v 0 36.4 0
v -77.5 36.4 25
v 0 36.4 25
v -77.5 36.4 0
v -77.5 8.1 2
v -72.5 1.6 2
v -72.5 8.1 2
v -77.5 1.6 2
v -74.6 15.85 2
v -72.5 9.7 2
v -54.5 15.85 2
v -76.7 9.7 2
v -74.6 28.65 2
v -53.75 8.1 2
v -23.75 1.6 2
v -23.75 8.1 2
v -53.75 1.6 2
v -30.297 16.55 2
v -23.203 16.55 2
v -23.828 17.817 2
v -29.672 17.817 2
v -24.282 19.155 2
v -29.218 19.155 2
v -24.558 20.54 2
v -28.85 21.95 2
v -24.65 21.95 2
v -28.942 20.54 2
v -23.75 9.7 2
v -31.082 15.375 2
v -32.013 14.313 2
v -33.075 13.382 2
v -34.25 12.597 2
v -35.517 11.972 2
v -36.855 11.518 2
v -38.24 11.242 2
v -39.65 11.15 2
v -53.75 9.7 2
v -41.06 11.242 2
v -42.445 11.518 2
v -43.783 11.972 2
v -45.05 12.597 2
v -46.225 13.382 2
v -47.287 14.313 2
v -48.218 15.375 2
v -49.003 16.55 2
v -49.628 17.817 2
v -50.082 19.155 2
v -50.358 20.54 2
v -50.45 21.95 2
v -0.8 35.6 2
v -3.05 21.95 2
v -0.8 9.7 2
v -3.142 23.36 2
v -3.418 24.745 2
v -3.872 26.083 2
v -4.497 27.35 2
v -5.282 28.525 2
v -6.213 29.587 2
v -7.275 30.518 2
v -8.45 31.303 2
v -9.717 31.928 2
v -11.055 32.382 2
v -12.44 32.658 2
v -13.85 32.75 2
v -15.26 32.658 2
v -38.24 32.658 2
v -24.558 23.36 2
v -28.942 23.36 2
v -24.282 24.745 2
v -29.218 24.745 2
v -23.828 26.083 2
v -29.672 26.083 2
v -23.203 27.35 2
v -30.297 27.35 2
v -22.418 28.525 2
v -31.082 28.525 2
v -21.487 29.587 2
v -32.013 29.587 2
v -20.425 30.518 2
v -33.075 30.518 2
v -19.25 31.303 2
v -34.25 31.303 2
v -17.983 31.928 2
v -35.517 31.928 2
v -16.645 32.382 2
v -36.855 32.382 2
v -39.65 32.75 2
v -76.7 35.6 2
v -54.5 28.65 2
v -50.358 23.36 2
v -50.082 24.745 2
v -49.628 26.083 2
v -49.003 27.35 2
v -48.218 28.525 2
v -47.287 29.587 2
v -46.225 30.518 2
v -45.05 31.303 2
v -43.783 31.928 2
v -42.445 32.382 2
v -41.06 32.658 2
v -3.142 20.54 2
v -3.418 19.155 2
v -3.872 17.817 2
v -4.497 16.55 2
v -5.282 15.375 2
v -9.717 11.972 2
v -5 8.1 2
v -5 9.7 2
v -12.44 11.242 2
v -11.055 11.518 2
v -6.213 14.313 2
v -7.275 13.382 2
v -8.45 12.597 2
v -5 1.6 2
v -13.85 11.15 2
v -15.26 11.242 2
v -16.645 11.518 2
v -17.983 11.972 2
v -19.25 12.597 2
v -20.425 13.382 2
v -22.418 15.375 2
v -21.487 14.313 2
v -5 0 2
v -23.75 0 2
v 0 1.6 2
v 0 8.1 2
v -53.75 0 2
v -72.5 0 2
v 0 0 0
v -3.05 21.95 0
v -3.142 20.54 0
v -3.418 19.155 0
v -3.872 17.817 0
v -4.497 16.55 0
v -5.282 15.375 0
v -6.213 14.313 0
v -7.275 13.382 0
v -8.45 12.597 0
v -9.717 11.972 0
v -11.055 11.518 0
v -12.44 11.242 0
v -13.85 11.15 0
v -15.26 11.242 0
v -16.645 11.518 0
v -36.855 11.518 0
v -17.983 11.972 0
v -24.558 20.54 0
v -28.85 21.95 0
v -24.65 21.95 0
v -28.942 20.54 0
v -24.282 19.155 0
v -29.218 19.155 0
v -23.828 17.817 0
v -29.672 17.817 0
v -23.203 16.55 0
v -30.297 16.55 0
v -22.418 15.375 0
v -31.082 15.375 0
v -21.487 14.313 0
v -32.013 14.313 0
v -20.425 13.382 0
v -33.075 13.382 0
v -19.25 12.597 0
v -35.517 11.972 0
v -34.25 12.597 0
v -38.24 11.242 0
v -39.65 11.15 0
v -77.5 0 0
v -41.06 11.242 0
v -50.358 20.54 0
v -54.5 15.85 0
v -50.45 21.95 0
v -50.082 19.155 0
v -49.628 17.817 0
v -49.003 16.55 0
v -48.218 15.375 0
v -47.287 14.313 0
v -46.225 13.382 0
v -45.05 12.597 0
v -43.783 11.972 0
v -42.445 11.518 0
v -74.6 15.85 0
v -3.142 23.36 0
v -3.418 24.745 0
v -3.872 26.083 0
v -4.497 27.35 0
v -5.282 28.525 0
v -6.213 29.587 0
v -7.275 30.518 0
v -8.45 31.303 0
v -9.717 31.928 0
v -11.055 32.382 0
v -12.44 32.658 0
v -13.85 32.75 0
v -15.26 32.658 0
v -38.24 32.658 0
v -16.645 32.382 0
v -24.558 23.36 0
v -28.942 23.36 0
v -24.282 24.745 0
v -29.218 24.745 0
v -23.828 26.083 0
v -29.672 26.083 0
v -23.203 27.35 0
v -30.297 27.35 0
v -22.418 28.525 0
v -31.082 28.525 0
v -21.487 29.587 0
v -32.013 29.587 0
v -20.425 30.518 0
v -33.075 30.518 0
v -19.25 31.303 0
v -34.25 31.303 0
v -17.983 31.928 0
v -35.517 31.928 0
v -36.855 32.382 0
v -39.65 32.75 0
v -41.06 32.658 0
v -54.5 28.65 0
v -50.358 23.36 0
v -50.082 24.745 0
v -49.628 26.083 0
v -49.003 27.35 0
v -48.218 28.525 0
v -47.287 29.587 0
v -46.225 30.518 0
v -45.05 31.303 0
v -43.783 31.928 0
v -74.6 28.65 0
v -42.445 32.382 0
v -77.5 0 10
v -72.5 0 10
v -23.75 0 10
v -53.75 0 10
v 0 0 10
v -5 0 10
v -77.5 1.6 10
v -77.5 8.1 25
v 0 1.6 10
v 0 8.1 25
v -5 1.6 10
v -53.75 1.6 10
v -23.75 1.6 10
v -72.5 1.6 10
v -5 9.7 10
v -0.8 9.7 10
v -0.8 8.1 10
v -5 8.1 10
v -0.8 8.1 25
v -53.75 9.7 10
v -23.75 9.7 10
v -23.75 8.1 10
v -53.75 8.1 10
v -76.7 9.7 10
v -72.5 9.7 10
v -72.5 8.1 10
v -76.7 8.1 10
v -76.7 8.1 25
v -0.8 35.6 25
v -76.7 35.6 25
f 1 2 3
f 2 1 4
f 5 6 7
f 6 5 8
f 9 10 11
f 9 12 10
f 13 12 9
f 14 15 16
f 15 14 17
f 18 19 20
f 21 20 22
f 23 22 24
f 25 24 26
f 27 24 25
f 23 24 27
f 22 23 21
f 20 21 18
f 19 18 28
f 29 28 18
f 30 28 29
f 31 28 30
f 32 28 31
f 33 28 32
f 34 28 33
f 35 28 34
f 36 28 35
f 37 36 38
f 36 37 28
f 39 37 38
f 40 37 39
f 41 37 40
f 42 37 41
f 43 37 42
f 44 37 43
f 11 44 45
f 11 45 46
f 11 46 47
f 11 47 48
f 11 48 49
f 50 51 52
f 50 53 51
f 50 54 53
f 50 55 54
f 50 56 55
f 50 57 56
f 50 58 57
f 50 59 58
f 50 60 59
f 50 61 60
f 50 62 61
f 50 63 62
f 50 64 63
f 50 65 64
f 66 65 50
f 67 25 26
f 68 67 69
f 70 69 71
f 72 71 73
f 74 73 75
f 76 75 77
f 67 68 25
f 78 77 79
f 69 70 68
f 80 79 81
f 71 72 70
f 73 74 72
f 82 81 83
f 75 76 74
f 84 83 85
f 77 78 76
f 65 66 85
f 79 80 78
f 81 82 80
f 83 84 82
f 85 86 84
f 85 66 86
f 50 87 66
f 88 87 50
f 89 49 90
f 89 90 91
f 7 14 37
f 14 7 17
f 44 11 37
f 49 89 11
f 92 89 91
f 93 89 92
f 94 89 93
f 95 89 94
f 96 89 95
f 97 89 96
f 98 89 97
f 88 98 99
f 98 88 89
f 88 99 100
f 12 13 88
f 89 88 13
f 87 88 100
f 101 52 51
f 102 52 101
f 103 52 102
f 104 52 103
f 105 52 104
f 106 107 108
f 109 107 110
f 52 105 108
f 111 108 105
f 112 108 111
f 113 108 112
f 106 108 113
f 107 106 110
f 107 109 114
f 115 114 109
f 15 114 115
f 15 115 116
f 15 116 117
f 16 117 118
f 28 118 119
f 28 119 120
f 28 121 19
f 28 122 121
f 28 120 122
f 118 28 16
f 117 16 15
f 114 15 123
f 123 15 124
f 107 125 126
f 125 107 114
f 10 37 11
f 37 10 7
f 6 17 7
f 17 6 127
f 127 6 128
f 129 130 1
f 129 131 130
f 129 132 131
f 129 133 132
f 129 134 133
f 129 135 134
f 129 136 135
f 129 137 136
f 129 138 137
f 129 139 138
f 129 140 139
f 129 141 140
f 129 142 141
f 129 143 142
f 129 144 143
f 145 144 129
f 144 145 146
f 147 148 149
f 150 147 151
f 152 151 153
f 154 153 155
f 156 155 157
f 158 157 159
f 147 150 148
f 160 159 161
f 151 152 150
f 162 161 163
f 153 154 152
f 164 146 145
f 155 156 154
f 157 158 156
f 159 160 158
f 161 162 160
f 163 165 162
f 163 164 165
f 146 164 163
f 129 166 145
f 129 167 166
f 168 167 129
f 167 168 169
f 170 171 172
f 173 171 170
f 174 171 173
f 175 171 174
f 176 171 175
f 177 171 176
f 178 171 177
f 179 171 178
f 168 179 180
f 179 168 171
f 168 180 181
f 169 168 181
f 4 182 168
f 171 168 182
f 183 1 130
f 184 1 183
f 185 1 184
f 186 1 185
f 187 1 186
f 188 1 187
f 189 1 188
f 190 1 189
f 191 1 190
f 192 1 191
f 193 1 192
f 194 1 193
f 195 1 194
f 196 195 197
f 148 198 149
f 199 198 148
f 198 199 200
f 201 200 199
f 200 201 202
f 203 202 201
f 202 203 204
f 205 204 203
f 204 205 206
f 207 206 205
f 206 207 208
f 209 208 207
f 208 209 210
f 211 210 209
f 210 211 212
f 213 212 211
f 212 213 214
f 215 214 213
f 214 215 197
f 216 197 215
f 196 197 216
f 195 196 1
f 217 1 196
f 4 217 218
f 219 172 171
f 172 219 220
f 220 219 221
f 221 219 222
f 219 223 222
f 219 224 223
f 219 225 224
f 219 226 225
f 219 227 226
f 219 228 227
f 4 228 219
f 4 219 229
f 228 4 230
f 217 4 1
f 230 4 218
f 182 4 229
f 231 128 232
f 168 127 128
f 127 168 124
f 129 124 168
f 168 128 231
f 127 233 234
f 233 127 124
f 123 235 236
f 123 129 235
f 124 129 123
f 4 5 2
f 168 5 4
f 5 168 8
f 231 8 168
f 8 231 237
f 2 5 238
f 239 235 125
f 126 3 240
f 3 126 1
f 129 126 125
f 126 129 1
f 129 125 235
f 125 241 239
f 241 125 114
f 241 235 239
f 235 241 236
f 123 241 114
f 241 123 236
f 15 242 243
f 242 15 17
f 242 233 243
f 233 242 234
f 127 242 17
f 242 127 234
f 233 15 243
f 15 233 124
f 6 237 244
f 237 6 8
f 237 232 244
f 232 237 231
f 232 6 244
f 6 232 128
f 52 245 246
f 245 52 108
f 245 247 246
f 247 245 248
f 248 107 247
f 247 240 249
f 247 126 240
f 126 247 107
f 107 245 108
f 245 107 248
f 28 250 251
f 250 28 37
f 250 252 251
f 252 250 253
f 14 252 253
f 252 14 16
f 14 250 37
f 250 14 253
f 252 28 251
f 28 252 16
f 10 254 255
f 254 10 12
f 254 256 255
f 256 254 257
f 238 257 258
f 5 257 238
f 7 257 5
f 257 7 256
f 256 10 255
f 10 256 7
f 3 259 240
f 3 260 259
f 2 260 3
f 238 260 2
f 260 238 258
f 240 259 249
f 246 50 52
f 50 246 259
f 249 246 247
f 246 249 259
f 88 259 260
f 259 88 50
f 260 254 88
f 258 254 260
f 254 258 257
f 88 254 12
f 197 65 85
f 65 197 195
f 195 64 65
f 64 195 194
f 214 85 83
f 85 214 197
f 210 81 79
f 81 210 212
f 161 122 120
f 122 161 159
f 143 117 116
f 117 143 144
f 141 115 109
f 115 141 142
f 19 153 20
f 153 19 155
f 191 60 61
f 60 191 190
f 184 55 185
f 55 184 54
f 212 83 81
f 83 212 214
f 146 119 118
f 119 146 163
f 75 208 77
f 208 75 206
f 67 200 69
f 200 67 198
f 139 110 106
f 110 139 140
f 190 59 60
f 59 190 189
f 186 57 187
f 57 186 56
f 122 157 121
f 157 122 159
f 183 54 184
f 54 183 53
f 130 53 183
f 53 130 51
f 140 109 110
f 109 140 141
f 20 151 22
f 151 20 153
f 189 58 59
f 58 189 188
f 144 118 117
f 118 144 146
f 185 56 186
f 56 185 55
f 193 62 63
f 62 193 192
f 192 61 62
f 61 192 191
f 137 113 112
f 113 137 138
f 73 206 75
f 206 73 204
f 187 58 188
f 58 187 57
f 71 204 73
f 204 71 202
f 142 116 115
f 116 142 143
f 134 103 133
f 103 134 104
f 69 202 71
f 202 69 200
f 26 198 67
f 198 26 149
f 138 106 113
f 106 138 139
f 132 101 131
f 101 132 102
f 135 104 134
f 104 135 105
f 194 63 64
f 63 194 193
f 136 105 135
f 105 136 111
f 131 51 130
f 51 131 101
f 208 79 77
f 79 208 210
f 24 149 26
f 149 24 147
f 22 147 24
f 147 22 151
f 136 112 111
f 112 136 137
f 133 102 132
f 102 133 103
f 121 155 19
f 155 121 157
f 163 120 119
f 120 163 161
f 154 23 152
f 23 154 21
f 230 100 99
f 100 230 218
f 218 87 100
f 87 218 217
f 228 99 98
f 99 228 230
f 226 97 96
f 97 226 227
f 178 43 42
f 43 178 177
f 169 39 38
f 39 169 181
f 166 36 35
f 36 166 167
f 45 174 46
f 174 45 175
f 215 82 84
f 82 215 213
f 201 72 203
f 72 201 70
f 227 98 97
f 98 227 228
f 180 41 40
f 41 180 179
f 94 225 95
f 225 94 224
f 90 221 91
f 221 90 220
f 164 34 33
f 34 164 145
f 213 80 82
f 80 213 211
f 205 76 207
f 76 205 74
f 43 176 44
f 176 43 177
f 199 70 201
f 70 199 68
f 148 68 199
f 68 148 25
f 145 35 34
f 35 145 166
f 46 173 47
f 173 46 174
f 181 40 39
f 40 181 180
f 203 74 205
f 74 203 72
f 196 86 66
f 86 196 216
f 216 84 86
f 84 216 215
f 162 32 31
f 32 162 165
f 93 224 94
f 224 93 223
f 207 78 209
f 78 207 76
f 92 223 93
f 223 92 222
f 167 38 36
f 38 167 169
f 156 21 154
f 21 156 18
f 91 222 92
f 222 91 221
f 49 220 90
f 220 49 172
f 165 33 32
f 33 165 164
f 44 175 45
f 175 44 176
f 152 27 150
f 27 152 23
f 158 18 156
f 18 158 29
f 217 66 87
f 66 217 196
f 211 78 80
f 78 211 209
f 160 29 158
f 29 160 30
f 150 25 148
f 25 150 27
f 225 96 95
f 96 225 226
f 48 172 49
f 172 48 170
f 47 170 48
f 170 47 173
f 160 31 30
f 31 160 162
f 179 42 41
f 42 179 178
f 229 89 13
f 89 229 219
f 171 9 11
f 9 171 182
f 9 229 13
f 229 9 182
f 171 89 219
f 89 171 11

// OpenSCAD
//Buttons to be generated. Add any number of "O"s and/or "I"s, part will be scaled accordingly.
buttons = "OOI";

// Height of the enclosure. Enclosure ensures that the exposed cable heads are out of reach.
enclosure_height = 25;

// Thickness of the enclosure. This part will not bear any force, thus it can be quite thin.
enclosure_thickness = 0.8;

// Clearance around the parts. Depends on the machine, generally, 0.25 is extremely tight fit, 0.5 will be movable.
clearance = 0.3;

// Spacing between buttons. If you are having trouble fitting cabling, try increasing this.
spacing = 2.5;

// Thickness of the place that this part will be snapped. Acrylic frame of M505 is 7.5mm.
host_thickness = 7.5;

// Thickness of the front panel. Should be strong enough to withstand pressure while pressing the buttons.
front_thickness = 2;

// Thickness of the support parts that snaps to the host. Should be strong enough to withstand pressure while pressing the buttons. Making this value multiple of extrusion width is a good idea.
support_thickness = 1.6;

// Height of the support parts that snaps to the host. If the panel is trying to turn while pressing the button, increase this height. It should be larger than the host_thickness for best effect.
support_height = 10;

// Width of the side supports. Spacing between supports allows panel to be placed junctions.
support_sides = 5;

// Width of the middle support. Spacing between supports allows panel to be placed junctions.
support_middle = 30;


/* [Advanced] */
// Diameter of the O buttons
o_size = 23.3;

// Diameter of the O buttons
o_space = 21;


// Width of the rectangular buttons
i_width = 14.85;

// Height of the rectangular buttons
i_height = 20.9;

// Width of the rectangular buttons
i_space_width = 12.2;

// Height of the rectangular buttons
i_space_height = 19.5;


/* [Hidden] */

function sumsize(vec, n) = 
    len(vec)-1 == n ? 
        (vec[n] == "O" ? o_size : i_height) : 
        sumsize(vec, n+1) + spacing + (vec[n] == "O" ? o_size : i_height) 
;

function has_o(vec, n) = 
    len(vec)-1 == n ? 
        (vec[n] == "O" ? 1 : 0) : 
        (has_o(vec, n+1) ? 1 : (vec[n] == "O" ? 1 : 0)) 
;

function offset_until(vec, c, n) = 
    c == n ?
        spacing :
        offset_until(vec, c+1, n) + (vec[c] == "O" ? o_size : i_height) + spacing
;

depth = sumsize(buttons, 0) + spacing*2;

support_space = (depth - support_middle - support_sides*2)/2;

support_offset = host_thickness + clearance * 2;

haso = has_o(buttons, 0);

width = (haso ? o_size : i_width) + spacing * 2 + support_offset;
    
module clip() {
    cube([width, depth, front_thickness]);

    cube([support_thickness, support_sides, support_height]);
    
    translate([0, support_space + support_sides])
    cube([support_thickness, support_middle, support_height]);    
    
    translate([0, support_space*2 + support_sides+support_middle])
    cube([support_thickness, support_sides, support_height]);

    translate([support_offset, 0])
    cube([support_thickness, support_sides, support_height]);
    
    translate([support_offset, support_space + support_sides])
    cube([support_thickness, support_middle, support_height]);   
    
    translate([support_offset, support_space*2 + support_sides+support_middle])
    cube([support_thickness, support_sides, support_height]);    
    
    //walls
    translate([support_offset, 0])
    cube([width - support_offset, enclosure_thickness, enclosure_height]);
    
    translate([width-enclosure_thickness,0])
    cube([enclosure_thickness, depth, enclosure_height]);
    
    translate([support_offset, depth - enclosure_thickness])
    cube([width - support_offset, enclosure_thickness, enclosure_height]);
}

module round_button() {
    translate([o_size/2 - clearance, o_size/2 - clearance])
    cylinder(r=o_space/2 + clearance, h=enclosure_height+1, $fn=48);

    /*color(red)
    translate([23.3/2 ,23.3/2])
    #cylinder(r=23.3/2, h=25);*/

}

module button() {
    translate([(i_width - i_space_width - clearance * 2)/2, (i_height - i_space_height - clearance * 2)/2])
    cube([i_space_width + clearance * 2, i_space_height + clearance * 2, enclosure_height+1]);

    /*color(red)
    #cube([14.85, 20.9, 25]);*/
}

module all() {
    difference() {
        clip();
        
        for(b = [0:len(buttons)-1]) {
            if(buttons[b] == "O") {
                translate([support_offset + spacing, offset_until(buttons, 0, b), -0.1])
                round_button();
            }
            else {
                translate([support_offset + spacing + (haso ? (o_size-i_width)/2 : 0), offset_until(buttons, 0, b), -0.1])
                button();
            }
            
            echo(offset_until(buttons, 0, b));
        }
    }
}

rotate([0,0,90])
all();
